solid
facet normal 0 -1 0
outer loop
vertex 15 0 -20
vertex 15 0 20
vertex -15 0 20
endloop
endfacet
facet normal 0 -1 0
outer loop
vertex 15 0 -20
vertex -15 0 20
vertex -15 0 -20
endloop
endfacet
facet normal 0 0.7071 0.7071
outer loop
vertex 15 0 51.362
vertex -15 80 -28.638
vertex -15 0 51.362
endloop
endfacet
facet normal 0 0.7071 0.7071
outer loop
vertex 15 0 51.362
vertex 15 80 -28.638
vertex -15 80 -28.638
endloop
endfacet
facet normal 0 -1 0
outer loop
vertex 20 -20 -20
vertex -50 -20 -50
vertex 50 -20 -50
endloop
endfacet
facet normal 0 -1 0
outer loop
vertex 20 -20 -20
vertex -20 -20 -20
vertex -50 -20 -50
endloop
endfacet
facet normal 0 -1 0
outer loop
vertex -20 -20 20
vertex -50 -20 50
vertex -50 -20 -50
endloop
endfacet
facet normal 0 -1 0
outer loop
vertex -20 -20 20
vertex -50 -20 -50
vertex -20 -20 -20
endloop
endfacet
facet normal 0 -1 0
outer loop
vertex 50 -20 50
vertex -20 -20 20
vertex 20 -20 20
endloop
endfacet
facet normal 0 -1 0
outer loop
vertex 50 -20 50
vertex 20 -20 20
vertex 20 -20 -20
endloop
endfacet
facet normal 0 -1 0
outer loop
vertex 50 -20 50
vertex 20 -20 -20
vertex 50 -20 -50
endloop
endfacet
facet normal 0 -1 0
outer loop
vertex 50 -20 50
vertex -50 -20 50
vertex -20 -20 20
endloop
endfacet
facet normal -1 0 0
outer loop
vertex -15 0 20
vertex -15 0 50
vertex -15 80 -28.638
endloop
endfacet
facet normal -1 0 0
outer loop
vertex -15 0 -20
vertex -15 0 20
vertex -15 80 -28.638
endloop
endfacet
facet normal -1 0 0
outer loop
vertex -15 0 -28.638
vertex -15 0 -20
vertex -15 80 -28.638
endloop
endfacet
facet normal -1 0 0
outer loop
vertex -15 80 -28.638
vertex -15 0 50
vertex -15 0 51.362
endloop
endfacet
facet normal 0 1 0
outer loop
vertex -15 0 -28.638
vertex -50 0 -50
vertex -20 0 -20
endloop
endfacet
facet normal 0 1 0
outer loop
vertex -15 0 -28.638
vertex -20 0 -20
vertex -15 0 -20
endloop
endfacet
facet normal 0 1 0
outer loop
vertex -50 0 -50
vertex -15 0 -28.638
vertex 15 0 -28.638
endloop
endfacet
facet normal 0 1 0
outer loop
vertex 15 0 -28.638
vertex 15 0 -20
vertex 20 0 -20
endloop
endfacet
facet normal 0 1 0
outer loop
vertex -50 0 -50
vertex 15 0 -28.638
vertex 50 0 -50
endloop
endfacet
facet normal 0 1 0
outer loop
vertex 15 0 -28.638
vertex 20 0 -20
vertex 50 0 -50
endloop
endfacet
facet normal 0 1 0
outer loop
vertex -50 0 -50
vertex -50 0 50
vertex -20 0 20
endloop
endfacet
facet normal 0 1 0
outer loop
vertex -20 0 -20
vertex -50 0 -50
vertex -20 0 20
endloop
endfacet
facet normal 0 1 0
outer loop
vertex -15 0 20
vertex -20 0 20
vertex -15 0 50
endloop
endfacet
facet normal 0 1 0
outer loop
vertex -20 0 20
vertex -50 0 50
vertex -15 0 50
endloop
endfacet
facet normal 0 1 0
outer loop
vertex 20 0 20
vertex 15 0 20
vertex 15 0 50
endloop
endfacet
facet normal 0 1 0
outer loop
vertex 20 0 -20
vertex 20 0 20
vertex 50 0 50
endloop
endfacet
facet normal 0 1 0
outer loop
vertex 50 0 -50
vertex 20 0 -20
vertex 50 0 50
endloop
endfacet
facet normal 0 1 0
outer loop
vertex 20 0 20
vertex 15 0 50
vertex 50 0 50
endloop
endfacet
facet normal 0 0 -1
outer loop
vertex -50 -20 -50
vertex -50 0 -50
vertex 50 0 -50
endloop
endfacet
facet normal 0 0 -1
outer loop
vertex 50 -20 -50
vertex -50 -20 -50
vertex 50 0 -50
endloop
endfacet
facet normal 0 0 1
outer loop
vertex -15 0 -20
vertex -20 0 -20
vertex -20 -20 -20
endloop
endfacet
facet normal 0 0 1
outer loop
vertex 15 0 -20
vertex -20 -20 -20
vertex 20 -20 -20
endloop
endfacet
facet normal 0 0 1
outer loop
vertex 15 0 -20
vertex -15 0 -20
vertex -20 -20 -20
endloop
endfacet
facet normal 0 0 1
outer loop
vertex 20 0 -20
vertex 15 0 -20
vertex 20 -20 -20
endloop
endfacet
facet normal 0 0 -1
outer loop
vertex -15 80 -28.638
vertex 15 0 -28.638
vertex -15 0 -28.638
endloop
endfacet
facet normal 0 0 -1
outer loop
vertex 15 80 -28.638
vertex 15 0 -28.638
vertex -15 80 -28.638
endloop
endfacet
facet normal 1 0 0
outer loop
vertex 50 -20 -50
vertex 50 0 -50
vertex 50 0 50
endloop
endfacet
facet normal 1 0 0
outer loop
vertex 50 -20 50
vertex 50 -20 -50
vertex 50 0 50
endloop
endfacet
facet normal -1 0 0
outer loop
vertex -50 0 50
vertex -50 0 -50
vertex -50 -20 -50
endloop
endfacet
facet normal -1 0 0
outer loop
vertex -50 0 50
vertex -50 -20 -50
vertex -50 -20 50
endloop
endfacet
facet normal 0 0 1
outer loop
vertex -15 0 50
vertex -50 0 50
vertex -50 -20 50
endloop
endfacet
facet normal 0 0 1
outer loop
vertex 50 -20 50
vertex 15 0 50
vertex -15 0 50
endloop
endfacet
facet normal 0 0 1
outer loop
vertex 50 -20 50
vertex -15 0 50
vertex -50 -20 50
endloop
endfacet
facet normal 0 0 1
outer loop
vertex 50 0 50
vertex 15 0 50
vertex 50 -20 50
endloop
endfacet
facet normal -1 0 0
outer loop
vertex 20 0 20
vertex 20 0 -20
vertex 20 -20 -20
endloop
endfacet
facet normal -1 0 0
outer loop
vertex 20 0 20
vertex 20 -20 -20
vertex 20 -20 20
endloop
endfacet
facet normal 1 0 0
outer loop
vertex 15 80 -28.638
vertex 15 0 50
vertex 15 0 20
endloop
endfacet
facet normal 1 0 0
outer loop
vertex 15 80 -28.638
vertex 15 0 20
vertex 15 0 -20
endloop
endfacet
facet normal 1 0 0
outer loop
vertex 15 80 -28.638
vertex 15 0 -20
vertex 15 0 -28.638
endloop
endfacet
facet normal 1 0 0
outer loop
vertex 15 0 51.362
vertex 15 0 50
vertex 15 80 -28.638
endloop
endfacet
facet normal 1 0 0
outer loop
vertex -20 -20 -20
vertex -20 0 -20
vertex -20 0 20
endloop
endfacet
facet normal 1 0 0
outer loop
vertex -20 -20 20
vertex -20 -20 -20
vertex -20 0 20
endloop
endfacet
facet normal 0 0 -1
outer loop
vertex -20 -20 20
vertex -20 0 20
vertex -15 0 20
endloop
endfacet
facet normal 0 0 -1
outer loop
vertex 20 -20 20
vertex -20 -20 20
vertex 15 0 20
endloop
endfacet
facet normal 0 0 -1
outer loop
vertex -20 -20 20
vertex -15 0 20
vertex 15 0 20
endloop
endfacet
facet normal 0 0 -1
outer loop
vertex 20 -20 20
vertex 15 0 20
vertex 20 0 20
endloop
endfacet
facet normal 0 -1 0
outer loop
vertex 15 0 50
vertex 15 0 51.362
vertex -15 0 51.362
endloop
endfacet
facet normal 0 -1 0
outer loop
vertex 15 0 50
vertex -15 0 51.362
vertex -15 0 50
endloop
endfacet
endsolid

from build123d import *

# Parameters (mm, degrees)
F0_W     = 100
F0_H     = 100
F0_W_2   = 40
F0_H_2   = 40
F1_DEPTH = 20
F3_DEPTH = 15


with BuildPart() as f1:
    # F0 (on Front) → F1 (new body)
    with BuildSketch(Plane.XZ):
        Rectangle(F0_W, F0_H)
        Rectangle(F0_W_2, F0_H_2, mode=Mode.SUBTRACT)
    extrude(amount=F1_DEPTH)

    # F2 (on Right) → F3 (join, symmetric)
    with BuildSketch(Plane.YZ):
        Polygon((80, -28.63813), (0, 51.36187), (0, -28.63813), align=None)
    extrude(amount=F3_DEPTH, both=True)


solid = f1.part
